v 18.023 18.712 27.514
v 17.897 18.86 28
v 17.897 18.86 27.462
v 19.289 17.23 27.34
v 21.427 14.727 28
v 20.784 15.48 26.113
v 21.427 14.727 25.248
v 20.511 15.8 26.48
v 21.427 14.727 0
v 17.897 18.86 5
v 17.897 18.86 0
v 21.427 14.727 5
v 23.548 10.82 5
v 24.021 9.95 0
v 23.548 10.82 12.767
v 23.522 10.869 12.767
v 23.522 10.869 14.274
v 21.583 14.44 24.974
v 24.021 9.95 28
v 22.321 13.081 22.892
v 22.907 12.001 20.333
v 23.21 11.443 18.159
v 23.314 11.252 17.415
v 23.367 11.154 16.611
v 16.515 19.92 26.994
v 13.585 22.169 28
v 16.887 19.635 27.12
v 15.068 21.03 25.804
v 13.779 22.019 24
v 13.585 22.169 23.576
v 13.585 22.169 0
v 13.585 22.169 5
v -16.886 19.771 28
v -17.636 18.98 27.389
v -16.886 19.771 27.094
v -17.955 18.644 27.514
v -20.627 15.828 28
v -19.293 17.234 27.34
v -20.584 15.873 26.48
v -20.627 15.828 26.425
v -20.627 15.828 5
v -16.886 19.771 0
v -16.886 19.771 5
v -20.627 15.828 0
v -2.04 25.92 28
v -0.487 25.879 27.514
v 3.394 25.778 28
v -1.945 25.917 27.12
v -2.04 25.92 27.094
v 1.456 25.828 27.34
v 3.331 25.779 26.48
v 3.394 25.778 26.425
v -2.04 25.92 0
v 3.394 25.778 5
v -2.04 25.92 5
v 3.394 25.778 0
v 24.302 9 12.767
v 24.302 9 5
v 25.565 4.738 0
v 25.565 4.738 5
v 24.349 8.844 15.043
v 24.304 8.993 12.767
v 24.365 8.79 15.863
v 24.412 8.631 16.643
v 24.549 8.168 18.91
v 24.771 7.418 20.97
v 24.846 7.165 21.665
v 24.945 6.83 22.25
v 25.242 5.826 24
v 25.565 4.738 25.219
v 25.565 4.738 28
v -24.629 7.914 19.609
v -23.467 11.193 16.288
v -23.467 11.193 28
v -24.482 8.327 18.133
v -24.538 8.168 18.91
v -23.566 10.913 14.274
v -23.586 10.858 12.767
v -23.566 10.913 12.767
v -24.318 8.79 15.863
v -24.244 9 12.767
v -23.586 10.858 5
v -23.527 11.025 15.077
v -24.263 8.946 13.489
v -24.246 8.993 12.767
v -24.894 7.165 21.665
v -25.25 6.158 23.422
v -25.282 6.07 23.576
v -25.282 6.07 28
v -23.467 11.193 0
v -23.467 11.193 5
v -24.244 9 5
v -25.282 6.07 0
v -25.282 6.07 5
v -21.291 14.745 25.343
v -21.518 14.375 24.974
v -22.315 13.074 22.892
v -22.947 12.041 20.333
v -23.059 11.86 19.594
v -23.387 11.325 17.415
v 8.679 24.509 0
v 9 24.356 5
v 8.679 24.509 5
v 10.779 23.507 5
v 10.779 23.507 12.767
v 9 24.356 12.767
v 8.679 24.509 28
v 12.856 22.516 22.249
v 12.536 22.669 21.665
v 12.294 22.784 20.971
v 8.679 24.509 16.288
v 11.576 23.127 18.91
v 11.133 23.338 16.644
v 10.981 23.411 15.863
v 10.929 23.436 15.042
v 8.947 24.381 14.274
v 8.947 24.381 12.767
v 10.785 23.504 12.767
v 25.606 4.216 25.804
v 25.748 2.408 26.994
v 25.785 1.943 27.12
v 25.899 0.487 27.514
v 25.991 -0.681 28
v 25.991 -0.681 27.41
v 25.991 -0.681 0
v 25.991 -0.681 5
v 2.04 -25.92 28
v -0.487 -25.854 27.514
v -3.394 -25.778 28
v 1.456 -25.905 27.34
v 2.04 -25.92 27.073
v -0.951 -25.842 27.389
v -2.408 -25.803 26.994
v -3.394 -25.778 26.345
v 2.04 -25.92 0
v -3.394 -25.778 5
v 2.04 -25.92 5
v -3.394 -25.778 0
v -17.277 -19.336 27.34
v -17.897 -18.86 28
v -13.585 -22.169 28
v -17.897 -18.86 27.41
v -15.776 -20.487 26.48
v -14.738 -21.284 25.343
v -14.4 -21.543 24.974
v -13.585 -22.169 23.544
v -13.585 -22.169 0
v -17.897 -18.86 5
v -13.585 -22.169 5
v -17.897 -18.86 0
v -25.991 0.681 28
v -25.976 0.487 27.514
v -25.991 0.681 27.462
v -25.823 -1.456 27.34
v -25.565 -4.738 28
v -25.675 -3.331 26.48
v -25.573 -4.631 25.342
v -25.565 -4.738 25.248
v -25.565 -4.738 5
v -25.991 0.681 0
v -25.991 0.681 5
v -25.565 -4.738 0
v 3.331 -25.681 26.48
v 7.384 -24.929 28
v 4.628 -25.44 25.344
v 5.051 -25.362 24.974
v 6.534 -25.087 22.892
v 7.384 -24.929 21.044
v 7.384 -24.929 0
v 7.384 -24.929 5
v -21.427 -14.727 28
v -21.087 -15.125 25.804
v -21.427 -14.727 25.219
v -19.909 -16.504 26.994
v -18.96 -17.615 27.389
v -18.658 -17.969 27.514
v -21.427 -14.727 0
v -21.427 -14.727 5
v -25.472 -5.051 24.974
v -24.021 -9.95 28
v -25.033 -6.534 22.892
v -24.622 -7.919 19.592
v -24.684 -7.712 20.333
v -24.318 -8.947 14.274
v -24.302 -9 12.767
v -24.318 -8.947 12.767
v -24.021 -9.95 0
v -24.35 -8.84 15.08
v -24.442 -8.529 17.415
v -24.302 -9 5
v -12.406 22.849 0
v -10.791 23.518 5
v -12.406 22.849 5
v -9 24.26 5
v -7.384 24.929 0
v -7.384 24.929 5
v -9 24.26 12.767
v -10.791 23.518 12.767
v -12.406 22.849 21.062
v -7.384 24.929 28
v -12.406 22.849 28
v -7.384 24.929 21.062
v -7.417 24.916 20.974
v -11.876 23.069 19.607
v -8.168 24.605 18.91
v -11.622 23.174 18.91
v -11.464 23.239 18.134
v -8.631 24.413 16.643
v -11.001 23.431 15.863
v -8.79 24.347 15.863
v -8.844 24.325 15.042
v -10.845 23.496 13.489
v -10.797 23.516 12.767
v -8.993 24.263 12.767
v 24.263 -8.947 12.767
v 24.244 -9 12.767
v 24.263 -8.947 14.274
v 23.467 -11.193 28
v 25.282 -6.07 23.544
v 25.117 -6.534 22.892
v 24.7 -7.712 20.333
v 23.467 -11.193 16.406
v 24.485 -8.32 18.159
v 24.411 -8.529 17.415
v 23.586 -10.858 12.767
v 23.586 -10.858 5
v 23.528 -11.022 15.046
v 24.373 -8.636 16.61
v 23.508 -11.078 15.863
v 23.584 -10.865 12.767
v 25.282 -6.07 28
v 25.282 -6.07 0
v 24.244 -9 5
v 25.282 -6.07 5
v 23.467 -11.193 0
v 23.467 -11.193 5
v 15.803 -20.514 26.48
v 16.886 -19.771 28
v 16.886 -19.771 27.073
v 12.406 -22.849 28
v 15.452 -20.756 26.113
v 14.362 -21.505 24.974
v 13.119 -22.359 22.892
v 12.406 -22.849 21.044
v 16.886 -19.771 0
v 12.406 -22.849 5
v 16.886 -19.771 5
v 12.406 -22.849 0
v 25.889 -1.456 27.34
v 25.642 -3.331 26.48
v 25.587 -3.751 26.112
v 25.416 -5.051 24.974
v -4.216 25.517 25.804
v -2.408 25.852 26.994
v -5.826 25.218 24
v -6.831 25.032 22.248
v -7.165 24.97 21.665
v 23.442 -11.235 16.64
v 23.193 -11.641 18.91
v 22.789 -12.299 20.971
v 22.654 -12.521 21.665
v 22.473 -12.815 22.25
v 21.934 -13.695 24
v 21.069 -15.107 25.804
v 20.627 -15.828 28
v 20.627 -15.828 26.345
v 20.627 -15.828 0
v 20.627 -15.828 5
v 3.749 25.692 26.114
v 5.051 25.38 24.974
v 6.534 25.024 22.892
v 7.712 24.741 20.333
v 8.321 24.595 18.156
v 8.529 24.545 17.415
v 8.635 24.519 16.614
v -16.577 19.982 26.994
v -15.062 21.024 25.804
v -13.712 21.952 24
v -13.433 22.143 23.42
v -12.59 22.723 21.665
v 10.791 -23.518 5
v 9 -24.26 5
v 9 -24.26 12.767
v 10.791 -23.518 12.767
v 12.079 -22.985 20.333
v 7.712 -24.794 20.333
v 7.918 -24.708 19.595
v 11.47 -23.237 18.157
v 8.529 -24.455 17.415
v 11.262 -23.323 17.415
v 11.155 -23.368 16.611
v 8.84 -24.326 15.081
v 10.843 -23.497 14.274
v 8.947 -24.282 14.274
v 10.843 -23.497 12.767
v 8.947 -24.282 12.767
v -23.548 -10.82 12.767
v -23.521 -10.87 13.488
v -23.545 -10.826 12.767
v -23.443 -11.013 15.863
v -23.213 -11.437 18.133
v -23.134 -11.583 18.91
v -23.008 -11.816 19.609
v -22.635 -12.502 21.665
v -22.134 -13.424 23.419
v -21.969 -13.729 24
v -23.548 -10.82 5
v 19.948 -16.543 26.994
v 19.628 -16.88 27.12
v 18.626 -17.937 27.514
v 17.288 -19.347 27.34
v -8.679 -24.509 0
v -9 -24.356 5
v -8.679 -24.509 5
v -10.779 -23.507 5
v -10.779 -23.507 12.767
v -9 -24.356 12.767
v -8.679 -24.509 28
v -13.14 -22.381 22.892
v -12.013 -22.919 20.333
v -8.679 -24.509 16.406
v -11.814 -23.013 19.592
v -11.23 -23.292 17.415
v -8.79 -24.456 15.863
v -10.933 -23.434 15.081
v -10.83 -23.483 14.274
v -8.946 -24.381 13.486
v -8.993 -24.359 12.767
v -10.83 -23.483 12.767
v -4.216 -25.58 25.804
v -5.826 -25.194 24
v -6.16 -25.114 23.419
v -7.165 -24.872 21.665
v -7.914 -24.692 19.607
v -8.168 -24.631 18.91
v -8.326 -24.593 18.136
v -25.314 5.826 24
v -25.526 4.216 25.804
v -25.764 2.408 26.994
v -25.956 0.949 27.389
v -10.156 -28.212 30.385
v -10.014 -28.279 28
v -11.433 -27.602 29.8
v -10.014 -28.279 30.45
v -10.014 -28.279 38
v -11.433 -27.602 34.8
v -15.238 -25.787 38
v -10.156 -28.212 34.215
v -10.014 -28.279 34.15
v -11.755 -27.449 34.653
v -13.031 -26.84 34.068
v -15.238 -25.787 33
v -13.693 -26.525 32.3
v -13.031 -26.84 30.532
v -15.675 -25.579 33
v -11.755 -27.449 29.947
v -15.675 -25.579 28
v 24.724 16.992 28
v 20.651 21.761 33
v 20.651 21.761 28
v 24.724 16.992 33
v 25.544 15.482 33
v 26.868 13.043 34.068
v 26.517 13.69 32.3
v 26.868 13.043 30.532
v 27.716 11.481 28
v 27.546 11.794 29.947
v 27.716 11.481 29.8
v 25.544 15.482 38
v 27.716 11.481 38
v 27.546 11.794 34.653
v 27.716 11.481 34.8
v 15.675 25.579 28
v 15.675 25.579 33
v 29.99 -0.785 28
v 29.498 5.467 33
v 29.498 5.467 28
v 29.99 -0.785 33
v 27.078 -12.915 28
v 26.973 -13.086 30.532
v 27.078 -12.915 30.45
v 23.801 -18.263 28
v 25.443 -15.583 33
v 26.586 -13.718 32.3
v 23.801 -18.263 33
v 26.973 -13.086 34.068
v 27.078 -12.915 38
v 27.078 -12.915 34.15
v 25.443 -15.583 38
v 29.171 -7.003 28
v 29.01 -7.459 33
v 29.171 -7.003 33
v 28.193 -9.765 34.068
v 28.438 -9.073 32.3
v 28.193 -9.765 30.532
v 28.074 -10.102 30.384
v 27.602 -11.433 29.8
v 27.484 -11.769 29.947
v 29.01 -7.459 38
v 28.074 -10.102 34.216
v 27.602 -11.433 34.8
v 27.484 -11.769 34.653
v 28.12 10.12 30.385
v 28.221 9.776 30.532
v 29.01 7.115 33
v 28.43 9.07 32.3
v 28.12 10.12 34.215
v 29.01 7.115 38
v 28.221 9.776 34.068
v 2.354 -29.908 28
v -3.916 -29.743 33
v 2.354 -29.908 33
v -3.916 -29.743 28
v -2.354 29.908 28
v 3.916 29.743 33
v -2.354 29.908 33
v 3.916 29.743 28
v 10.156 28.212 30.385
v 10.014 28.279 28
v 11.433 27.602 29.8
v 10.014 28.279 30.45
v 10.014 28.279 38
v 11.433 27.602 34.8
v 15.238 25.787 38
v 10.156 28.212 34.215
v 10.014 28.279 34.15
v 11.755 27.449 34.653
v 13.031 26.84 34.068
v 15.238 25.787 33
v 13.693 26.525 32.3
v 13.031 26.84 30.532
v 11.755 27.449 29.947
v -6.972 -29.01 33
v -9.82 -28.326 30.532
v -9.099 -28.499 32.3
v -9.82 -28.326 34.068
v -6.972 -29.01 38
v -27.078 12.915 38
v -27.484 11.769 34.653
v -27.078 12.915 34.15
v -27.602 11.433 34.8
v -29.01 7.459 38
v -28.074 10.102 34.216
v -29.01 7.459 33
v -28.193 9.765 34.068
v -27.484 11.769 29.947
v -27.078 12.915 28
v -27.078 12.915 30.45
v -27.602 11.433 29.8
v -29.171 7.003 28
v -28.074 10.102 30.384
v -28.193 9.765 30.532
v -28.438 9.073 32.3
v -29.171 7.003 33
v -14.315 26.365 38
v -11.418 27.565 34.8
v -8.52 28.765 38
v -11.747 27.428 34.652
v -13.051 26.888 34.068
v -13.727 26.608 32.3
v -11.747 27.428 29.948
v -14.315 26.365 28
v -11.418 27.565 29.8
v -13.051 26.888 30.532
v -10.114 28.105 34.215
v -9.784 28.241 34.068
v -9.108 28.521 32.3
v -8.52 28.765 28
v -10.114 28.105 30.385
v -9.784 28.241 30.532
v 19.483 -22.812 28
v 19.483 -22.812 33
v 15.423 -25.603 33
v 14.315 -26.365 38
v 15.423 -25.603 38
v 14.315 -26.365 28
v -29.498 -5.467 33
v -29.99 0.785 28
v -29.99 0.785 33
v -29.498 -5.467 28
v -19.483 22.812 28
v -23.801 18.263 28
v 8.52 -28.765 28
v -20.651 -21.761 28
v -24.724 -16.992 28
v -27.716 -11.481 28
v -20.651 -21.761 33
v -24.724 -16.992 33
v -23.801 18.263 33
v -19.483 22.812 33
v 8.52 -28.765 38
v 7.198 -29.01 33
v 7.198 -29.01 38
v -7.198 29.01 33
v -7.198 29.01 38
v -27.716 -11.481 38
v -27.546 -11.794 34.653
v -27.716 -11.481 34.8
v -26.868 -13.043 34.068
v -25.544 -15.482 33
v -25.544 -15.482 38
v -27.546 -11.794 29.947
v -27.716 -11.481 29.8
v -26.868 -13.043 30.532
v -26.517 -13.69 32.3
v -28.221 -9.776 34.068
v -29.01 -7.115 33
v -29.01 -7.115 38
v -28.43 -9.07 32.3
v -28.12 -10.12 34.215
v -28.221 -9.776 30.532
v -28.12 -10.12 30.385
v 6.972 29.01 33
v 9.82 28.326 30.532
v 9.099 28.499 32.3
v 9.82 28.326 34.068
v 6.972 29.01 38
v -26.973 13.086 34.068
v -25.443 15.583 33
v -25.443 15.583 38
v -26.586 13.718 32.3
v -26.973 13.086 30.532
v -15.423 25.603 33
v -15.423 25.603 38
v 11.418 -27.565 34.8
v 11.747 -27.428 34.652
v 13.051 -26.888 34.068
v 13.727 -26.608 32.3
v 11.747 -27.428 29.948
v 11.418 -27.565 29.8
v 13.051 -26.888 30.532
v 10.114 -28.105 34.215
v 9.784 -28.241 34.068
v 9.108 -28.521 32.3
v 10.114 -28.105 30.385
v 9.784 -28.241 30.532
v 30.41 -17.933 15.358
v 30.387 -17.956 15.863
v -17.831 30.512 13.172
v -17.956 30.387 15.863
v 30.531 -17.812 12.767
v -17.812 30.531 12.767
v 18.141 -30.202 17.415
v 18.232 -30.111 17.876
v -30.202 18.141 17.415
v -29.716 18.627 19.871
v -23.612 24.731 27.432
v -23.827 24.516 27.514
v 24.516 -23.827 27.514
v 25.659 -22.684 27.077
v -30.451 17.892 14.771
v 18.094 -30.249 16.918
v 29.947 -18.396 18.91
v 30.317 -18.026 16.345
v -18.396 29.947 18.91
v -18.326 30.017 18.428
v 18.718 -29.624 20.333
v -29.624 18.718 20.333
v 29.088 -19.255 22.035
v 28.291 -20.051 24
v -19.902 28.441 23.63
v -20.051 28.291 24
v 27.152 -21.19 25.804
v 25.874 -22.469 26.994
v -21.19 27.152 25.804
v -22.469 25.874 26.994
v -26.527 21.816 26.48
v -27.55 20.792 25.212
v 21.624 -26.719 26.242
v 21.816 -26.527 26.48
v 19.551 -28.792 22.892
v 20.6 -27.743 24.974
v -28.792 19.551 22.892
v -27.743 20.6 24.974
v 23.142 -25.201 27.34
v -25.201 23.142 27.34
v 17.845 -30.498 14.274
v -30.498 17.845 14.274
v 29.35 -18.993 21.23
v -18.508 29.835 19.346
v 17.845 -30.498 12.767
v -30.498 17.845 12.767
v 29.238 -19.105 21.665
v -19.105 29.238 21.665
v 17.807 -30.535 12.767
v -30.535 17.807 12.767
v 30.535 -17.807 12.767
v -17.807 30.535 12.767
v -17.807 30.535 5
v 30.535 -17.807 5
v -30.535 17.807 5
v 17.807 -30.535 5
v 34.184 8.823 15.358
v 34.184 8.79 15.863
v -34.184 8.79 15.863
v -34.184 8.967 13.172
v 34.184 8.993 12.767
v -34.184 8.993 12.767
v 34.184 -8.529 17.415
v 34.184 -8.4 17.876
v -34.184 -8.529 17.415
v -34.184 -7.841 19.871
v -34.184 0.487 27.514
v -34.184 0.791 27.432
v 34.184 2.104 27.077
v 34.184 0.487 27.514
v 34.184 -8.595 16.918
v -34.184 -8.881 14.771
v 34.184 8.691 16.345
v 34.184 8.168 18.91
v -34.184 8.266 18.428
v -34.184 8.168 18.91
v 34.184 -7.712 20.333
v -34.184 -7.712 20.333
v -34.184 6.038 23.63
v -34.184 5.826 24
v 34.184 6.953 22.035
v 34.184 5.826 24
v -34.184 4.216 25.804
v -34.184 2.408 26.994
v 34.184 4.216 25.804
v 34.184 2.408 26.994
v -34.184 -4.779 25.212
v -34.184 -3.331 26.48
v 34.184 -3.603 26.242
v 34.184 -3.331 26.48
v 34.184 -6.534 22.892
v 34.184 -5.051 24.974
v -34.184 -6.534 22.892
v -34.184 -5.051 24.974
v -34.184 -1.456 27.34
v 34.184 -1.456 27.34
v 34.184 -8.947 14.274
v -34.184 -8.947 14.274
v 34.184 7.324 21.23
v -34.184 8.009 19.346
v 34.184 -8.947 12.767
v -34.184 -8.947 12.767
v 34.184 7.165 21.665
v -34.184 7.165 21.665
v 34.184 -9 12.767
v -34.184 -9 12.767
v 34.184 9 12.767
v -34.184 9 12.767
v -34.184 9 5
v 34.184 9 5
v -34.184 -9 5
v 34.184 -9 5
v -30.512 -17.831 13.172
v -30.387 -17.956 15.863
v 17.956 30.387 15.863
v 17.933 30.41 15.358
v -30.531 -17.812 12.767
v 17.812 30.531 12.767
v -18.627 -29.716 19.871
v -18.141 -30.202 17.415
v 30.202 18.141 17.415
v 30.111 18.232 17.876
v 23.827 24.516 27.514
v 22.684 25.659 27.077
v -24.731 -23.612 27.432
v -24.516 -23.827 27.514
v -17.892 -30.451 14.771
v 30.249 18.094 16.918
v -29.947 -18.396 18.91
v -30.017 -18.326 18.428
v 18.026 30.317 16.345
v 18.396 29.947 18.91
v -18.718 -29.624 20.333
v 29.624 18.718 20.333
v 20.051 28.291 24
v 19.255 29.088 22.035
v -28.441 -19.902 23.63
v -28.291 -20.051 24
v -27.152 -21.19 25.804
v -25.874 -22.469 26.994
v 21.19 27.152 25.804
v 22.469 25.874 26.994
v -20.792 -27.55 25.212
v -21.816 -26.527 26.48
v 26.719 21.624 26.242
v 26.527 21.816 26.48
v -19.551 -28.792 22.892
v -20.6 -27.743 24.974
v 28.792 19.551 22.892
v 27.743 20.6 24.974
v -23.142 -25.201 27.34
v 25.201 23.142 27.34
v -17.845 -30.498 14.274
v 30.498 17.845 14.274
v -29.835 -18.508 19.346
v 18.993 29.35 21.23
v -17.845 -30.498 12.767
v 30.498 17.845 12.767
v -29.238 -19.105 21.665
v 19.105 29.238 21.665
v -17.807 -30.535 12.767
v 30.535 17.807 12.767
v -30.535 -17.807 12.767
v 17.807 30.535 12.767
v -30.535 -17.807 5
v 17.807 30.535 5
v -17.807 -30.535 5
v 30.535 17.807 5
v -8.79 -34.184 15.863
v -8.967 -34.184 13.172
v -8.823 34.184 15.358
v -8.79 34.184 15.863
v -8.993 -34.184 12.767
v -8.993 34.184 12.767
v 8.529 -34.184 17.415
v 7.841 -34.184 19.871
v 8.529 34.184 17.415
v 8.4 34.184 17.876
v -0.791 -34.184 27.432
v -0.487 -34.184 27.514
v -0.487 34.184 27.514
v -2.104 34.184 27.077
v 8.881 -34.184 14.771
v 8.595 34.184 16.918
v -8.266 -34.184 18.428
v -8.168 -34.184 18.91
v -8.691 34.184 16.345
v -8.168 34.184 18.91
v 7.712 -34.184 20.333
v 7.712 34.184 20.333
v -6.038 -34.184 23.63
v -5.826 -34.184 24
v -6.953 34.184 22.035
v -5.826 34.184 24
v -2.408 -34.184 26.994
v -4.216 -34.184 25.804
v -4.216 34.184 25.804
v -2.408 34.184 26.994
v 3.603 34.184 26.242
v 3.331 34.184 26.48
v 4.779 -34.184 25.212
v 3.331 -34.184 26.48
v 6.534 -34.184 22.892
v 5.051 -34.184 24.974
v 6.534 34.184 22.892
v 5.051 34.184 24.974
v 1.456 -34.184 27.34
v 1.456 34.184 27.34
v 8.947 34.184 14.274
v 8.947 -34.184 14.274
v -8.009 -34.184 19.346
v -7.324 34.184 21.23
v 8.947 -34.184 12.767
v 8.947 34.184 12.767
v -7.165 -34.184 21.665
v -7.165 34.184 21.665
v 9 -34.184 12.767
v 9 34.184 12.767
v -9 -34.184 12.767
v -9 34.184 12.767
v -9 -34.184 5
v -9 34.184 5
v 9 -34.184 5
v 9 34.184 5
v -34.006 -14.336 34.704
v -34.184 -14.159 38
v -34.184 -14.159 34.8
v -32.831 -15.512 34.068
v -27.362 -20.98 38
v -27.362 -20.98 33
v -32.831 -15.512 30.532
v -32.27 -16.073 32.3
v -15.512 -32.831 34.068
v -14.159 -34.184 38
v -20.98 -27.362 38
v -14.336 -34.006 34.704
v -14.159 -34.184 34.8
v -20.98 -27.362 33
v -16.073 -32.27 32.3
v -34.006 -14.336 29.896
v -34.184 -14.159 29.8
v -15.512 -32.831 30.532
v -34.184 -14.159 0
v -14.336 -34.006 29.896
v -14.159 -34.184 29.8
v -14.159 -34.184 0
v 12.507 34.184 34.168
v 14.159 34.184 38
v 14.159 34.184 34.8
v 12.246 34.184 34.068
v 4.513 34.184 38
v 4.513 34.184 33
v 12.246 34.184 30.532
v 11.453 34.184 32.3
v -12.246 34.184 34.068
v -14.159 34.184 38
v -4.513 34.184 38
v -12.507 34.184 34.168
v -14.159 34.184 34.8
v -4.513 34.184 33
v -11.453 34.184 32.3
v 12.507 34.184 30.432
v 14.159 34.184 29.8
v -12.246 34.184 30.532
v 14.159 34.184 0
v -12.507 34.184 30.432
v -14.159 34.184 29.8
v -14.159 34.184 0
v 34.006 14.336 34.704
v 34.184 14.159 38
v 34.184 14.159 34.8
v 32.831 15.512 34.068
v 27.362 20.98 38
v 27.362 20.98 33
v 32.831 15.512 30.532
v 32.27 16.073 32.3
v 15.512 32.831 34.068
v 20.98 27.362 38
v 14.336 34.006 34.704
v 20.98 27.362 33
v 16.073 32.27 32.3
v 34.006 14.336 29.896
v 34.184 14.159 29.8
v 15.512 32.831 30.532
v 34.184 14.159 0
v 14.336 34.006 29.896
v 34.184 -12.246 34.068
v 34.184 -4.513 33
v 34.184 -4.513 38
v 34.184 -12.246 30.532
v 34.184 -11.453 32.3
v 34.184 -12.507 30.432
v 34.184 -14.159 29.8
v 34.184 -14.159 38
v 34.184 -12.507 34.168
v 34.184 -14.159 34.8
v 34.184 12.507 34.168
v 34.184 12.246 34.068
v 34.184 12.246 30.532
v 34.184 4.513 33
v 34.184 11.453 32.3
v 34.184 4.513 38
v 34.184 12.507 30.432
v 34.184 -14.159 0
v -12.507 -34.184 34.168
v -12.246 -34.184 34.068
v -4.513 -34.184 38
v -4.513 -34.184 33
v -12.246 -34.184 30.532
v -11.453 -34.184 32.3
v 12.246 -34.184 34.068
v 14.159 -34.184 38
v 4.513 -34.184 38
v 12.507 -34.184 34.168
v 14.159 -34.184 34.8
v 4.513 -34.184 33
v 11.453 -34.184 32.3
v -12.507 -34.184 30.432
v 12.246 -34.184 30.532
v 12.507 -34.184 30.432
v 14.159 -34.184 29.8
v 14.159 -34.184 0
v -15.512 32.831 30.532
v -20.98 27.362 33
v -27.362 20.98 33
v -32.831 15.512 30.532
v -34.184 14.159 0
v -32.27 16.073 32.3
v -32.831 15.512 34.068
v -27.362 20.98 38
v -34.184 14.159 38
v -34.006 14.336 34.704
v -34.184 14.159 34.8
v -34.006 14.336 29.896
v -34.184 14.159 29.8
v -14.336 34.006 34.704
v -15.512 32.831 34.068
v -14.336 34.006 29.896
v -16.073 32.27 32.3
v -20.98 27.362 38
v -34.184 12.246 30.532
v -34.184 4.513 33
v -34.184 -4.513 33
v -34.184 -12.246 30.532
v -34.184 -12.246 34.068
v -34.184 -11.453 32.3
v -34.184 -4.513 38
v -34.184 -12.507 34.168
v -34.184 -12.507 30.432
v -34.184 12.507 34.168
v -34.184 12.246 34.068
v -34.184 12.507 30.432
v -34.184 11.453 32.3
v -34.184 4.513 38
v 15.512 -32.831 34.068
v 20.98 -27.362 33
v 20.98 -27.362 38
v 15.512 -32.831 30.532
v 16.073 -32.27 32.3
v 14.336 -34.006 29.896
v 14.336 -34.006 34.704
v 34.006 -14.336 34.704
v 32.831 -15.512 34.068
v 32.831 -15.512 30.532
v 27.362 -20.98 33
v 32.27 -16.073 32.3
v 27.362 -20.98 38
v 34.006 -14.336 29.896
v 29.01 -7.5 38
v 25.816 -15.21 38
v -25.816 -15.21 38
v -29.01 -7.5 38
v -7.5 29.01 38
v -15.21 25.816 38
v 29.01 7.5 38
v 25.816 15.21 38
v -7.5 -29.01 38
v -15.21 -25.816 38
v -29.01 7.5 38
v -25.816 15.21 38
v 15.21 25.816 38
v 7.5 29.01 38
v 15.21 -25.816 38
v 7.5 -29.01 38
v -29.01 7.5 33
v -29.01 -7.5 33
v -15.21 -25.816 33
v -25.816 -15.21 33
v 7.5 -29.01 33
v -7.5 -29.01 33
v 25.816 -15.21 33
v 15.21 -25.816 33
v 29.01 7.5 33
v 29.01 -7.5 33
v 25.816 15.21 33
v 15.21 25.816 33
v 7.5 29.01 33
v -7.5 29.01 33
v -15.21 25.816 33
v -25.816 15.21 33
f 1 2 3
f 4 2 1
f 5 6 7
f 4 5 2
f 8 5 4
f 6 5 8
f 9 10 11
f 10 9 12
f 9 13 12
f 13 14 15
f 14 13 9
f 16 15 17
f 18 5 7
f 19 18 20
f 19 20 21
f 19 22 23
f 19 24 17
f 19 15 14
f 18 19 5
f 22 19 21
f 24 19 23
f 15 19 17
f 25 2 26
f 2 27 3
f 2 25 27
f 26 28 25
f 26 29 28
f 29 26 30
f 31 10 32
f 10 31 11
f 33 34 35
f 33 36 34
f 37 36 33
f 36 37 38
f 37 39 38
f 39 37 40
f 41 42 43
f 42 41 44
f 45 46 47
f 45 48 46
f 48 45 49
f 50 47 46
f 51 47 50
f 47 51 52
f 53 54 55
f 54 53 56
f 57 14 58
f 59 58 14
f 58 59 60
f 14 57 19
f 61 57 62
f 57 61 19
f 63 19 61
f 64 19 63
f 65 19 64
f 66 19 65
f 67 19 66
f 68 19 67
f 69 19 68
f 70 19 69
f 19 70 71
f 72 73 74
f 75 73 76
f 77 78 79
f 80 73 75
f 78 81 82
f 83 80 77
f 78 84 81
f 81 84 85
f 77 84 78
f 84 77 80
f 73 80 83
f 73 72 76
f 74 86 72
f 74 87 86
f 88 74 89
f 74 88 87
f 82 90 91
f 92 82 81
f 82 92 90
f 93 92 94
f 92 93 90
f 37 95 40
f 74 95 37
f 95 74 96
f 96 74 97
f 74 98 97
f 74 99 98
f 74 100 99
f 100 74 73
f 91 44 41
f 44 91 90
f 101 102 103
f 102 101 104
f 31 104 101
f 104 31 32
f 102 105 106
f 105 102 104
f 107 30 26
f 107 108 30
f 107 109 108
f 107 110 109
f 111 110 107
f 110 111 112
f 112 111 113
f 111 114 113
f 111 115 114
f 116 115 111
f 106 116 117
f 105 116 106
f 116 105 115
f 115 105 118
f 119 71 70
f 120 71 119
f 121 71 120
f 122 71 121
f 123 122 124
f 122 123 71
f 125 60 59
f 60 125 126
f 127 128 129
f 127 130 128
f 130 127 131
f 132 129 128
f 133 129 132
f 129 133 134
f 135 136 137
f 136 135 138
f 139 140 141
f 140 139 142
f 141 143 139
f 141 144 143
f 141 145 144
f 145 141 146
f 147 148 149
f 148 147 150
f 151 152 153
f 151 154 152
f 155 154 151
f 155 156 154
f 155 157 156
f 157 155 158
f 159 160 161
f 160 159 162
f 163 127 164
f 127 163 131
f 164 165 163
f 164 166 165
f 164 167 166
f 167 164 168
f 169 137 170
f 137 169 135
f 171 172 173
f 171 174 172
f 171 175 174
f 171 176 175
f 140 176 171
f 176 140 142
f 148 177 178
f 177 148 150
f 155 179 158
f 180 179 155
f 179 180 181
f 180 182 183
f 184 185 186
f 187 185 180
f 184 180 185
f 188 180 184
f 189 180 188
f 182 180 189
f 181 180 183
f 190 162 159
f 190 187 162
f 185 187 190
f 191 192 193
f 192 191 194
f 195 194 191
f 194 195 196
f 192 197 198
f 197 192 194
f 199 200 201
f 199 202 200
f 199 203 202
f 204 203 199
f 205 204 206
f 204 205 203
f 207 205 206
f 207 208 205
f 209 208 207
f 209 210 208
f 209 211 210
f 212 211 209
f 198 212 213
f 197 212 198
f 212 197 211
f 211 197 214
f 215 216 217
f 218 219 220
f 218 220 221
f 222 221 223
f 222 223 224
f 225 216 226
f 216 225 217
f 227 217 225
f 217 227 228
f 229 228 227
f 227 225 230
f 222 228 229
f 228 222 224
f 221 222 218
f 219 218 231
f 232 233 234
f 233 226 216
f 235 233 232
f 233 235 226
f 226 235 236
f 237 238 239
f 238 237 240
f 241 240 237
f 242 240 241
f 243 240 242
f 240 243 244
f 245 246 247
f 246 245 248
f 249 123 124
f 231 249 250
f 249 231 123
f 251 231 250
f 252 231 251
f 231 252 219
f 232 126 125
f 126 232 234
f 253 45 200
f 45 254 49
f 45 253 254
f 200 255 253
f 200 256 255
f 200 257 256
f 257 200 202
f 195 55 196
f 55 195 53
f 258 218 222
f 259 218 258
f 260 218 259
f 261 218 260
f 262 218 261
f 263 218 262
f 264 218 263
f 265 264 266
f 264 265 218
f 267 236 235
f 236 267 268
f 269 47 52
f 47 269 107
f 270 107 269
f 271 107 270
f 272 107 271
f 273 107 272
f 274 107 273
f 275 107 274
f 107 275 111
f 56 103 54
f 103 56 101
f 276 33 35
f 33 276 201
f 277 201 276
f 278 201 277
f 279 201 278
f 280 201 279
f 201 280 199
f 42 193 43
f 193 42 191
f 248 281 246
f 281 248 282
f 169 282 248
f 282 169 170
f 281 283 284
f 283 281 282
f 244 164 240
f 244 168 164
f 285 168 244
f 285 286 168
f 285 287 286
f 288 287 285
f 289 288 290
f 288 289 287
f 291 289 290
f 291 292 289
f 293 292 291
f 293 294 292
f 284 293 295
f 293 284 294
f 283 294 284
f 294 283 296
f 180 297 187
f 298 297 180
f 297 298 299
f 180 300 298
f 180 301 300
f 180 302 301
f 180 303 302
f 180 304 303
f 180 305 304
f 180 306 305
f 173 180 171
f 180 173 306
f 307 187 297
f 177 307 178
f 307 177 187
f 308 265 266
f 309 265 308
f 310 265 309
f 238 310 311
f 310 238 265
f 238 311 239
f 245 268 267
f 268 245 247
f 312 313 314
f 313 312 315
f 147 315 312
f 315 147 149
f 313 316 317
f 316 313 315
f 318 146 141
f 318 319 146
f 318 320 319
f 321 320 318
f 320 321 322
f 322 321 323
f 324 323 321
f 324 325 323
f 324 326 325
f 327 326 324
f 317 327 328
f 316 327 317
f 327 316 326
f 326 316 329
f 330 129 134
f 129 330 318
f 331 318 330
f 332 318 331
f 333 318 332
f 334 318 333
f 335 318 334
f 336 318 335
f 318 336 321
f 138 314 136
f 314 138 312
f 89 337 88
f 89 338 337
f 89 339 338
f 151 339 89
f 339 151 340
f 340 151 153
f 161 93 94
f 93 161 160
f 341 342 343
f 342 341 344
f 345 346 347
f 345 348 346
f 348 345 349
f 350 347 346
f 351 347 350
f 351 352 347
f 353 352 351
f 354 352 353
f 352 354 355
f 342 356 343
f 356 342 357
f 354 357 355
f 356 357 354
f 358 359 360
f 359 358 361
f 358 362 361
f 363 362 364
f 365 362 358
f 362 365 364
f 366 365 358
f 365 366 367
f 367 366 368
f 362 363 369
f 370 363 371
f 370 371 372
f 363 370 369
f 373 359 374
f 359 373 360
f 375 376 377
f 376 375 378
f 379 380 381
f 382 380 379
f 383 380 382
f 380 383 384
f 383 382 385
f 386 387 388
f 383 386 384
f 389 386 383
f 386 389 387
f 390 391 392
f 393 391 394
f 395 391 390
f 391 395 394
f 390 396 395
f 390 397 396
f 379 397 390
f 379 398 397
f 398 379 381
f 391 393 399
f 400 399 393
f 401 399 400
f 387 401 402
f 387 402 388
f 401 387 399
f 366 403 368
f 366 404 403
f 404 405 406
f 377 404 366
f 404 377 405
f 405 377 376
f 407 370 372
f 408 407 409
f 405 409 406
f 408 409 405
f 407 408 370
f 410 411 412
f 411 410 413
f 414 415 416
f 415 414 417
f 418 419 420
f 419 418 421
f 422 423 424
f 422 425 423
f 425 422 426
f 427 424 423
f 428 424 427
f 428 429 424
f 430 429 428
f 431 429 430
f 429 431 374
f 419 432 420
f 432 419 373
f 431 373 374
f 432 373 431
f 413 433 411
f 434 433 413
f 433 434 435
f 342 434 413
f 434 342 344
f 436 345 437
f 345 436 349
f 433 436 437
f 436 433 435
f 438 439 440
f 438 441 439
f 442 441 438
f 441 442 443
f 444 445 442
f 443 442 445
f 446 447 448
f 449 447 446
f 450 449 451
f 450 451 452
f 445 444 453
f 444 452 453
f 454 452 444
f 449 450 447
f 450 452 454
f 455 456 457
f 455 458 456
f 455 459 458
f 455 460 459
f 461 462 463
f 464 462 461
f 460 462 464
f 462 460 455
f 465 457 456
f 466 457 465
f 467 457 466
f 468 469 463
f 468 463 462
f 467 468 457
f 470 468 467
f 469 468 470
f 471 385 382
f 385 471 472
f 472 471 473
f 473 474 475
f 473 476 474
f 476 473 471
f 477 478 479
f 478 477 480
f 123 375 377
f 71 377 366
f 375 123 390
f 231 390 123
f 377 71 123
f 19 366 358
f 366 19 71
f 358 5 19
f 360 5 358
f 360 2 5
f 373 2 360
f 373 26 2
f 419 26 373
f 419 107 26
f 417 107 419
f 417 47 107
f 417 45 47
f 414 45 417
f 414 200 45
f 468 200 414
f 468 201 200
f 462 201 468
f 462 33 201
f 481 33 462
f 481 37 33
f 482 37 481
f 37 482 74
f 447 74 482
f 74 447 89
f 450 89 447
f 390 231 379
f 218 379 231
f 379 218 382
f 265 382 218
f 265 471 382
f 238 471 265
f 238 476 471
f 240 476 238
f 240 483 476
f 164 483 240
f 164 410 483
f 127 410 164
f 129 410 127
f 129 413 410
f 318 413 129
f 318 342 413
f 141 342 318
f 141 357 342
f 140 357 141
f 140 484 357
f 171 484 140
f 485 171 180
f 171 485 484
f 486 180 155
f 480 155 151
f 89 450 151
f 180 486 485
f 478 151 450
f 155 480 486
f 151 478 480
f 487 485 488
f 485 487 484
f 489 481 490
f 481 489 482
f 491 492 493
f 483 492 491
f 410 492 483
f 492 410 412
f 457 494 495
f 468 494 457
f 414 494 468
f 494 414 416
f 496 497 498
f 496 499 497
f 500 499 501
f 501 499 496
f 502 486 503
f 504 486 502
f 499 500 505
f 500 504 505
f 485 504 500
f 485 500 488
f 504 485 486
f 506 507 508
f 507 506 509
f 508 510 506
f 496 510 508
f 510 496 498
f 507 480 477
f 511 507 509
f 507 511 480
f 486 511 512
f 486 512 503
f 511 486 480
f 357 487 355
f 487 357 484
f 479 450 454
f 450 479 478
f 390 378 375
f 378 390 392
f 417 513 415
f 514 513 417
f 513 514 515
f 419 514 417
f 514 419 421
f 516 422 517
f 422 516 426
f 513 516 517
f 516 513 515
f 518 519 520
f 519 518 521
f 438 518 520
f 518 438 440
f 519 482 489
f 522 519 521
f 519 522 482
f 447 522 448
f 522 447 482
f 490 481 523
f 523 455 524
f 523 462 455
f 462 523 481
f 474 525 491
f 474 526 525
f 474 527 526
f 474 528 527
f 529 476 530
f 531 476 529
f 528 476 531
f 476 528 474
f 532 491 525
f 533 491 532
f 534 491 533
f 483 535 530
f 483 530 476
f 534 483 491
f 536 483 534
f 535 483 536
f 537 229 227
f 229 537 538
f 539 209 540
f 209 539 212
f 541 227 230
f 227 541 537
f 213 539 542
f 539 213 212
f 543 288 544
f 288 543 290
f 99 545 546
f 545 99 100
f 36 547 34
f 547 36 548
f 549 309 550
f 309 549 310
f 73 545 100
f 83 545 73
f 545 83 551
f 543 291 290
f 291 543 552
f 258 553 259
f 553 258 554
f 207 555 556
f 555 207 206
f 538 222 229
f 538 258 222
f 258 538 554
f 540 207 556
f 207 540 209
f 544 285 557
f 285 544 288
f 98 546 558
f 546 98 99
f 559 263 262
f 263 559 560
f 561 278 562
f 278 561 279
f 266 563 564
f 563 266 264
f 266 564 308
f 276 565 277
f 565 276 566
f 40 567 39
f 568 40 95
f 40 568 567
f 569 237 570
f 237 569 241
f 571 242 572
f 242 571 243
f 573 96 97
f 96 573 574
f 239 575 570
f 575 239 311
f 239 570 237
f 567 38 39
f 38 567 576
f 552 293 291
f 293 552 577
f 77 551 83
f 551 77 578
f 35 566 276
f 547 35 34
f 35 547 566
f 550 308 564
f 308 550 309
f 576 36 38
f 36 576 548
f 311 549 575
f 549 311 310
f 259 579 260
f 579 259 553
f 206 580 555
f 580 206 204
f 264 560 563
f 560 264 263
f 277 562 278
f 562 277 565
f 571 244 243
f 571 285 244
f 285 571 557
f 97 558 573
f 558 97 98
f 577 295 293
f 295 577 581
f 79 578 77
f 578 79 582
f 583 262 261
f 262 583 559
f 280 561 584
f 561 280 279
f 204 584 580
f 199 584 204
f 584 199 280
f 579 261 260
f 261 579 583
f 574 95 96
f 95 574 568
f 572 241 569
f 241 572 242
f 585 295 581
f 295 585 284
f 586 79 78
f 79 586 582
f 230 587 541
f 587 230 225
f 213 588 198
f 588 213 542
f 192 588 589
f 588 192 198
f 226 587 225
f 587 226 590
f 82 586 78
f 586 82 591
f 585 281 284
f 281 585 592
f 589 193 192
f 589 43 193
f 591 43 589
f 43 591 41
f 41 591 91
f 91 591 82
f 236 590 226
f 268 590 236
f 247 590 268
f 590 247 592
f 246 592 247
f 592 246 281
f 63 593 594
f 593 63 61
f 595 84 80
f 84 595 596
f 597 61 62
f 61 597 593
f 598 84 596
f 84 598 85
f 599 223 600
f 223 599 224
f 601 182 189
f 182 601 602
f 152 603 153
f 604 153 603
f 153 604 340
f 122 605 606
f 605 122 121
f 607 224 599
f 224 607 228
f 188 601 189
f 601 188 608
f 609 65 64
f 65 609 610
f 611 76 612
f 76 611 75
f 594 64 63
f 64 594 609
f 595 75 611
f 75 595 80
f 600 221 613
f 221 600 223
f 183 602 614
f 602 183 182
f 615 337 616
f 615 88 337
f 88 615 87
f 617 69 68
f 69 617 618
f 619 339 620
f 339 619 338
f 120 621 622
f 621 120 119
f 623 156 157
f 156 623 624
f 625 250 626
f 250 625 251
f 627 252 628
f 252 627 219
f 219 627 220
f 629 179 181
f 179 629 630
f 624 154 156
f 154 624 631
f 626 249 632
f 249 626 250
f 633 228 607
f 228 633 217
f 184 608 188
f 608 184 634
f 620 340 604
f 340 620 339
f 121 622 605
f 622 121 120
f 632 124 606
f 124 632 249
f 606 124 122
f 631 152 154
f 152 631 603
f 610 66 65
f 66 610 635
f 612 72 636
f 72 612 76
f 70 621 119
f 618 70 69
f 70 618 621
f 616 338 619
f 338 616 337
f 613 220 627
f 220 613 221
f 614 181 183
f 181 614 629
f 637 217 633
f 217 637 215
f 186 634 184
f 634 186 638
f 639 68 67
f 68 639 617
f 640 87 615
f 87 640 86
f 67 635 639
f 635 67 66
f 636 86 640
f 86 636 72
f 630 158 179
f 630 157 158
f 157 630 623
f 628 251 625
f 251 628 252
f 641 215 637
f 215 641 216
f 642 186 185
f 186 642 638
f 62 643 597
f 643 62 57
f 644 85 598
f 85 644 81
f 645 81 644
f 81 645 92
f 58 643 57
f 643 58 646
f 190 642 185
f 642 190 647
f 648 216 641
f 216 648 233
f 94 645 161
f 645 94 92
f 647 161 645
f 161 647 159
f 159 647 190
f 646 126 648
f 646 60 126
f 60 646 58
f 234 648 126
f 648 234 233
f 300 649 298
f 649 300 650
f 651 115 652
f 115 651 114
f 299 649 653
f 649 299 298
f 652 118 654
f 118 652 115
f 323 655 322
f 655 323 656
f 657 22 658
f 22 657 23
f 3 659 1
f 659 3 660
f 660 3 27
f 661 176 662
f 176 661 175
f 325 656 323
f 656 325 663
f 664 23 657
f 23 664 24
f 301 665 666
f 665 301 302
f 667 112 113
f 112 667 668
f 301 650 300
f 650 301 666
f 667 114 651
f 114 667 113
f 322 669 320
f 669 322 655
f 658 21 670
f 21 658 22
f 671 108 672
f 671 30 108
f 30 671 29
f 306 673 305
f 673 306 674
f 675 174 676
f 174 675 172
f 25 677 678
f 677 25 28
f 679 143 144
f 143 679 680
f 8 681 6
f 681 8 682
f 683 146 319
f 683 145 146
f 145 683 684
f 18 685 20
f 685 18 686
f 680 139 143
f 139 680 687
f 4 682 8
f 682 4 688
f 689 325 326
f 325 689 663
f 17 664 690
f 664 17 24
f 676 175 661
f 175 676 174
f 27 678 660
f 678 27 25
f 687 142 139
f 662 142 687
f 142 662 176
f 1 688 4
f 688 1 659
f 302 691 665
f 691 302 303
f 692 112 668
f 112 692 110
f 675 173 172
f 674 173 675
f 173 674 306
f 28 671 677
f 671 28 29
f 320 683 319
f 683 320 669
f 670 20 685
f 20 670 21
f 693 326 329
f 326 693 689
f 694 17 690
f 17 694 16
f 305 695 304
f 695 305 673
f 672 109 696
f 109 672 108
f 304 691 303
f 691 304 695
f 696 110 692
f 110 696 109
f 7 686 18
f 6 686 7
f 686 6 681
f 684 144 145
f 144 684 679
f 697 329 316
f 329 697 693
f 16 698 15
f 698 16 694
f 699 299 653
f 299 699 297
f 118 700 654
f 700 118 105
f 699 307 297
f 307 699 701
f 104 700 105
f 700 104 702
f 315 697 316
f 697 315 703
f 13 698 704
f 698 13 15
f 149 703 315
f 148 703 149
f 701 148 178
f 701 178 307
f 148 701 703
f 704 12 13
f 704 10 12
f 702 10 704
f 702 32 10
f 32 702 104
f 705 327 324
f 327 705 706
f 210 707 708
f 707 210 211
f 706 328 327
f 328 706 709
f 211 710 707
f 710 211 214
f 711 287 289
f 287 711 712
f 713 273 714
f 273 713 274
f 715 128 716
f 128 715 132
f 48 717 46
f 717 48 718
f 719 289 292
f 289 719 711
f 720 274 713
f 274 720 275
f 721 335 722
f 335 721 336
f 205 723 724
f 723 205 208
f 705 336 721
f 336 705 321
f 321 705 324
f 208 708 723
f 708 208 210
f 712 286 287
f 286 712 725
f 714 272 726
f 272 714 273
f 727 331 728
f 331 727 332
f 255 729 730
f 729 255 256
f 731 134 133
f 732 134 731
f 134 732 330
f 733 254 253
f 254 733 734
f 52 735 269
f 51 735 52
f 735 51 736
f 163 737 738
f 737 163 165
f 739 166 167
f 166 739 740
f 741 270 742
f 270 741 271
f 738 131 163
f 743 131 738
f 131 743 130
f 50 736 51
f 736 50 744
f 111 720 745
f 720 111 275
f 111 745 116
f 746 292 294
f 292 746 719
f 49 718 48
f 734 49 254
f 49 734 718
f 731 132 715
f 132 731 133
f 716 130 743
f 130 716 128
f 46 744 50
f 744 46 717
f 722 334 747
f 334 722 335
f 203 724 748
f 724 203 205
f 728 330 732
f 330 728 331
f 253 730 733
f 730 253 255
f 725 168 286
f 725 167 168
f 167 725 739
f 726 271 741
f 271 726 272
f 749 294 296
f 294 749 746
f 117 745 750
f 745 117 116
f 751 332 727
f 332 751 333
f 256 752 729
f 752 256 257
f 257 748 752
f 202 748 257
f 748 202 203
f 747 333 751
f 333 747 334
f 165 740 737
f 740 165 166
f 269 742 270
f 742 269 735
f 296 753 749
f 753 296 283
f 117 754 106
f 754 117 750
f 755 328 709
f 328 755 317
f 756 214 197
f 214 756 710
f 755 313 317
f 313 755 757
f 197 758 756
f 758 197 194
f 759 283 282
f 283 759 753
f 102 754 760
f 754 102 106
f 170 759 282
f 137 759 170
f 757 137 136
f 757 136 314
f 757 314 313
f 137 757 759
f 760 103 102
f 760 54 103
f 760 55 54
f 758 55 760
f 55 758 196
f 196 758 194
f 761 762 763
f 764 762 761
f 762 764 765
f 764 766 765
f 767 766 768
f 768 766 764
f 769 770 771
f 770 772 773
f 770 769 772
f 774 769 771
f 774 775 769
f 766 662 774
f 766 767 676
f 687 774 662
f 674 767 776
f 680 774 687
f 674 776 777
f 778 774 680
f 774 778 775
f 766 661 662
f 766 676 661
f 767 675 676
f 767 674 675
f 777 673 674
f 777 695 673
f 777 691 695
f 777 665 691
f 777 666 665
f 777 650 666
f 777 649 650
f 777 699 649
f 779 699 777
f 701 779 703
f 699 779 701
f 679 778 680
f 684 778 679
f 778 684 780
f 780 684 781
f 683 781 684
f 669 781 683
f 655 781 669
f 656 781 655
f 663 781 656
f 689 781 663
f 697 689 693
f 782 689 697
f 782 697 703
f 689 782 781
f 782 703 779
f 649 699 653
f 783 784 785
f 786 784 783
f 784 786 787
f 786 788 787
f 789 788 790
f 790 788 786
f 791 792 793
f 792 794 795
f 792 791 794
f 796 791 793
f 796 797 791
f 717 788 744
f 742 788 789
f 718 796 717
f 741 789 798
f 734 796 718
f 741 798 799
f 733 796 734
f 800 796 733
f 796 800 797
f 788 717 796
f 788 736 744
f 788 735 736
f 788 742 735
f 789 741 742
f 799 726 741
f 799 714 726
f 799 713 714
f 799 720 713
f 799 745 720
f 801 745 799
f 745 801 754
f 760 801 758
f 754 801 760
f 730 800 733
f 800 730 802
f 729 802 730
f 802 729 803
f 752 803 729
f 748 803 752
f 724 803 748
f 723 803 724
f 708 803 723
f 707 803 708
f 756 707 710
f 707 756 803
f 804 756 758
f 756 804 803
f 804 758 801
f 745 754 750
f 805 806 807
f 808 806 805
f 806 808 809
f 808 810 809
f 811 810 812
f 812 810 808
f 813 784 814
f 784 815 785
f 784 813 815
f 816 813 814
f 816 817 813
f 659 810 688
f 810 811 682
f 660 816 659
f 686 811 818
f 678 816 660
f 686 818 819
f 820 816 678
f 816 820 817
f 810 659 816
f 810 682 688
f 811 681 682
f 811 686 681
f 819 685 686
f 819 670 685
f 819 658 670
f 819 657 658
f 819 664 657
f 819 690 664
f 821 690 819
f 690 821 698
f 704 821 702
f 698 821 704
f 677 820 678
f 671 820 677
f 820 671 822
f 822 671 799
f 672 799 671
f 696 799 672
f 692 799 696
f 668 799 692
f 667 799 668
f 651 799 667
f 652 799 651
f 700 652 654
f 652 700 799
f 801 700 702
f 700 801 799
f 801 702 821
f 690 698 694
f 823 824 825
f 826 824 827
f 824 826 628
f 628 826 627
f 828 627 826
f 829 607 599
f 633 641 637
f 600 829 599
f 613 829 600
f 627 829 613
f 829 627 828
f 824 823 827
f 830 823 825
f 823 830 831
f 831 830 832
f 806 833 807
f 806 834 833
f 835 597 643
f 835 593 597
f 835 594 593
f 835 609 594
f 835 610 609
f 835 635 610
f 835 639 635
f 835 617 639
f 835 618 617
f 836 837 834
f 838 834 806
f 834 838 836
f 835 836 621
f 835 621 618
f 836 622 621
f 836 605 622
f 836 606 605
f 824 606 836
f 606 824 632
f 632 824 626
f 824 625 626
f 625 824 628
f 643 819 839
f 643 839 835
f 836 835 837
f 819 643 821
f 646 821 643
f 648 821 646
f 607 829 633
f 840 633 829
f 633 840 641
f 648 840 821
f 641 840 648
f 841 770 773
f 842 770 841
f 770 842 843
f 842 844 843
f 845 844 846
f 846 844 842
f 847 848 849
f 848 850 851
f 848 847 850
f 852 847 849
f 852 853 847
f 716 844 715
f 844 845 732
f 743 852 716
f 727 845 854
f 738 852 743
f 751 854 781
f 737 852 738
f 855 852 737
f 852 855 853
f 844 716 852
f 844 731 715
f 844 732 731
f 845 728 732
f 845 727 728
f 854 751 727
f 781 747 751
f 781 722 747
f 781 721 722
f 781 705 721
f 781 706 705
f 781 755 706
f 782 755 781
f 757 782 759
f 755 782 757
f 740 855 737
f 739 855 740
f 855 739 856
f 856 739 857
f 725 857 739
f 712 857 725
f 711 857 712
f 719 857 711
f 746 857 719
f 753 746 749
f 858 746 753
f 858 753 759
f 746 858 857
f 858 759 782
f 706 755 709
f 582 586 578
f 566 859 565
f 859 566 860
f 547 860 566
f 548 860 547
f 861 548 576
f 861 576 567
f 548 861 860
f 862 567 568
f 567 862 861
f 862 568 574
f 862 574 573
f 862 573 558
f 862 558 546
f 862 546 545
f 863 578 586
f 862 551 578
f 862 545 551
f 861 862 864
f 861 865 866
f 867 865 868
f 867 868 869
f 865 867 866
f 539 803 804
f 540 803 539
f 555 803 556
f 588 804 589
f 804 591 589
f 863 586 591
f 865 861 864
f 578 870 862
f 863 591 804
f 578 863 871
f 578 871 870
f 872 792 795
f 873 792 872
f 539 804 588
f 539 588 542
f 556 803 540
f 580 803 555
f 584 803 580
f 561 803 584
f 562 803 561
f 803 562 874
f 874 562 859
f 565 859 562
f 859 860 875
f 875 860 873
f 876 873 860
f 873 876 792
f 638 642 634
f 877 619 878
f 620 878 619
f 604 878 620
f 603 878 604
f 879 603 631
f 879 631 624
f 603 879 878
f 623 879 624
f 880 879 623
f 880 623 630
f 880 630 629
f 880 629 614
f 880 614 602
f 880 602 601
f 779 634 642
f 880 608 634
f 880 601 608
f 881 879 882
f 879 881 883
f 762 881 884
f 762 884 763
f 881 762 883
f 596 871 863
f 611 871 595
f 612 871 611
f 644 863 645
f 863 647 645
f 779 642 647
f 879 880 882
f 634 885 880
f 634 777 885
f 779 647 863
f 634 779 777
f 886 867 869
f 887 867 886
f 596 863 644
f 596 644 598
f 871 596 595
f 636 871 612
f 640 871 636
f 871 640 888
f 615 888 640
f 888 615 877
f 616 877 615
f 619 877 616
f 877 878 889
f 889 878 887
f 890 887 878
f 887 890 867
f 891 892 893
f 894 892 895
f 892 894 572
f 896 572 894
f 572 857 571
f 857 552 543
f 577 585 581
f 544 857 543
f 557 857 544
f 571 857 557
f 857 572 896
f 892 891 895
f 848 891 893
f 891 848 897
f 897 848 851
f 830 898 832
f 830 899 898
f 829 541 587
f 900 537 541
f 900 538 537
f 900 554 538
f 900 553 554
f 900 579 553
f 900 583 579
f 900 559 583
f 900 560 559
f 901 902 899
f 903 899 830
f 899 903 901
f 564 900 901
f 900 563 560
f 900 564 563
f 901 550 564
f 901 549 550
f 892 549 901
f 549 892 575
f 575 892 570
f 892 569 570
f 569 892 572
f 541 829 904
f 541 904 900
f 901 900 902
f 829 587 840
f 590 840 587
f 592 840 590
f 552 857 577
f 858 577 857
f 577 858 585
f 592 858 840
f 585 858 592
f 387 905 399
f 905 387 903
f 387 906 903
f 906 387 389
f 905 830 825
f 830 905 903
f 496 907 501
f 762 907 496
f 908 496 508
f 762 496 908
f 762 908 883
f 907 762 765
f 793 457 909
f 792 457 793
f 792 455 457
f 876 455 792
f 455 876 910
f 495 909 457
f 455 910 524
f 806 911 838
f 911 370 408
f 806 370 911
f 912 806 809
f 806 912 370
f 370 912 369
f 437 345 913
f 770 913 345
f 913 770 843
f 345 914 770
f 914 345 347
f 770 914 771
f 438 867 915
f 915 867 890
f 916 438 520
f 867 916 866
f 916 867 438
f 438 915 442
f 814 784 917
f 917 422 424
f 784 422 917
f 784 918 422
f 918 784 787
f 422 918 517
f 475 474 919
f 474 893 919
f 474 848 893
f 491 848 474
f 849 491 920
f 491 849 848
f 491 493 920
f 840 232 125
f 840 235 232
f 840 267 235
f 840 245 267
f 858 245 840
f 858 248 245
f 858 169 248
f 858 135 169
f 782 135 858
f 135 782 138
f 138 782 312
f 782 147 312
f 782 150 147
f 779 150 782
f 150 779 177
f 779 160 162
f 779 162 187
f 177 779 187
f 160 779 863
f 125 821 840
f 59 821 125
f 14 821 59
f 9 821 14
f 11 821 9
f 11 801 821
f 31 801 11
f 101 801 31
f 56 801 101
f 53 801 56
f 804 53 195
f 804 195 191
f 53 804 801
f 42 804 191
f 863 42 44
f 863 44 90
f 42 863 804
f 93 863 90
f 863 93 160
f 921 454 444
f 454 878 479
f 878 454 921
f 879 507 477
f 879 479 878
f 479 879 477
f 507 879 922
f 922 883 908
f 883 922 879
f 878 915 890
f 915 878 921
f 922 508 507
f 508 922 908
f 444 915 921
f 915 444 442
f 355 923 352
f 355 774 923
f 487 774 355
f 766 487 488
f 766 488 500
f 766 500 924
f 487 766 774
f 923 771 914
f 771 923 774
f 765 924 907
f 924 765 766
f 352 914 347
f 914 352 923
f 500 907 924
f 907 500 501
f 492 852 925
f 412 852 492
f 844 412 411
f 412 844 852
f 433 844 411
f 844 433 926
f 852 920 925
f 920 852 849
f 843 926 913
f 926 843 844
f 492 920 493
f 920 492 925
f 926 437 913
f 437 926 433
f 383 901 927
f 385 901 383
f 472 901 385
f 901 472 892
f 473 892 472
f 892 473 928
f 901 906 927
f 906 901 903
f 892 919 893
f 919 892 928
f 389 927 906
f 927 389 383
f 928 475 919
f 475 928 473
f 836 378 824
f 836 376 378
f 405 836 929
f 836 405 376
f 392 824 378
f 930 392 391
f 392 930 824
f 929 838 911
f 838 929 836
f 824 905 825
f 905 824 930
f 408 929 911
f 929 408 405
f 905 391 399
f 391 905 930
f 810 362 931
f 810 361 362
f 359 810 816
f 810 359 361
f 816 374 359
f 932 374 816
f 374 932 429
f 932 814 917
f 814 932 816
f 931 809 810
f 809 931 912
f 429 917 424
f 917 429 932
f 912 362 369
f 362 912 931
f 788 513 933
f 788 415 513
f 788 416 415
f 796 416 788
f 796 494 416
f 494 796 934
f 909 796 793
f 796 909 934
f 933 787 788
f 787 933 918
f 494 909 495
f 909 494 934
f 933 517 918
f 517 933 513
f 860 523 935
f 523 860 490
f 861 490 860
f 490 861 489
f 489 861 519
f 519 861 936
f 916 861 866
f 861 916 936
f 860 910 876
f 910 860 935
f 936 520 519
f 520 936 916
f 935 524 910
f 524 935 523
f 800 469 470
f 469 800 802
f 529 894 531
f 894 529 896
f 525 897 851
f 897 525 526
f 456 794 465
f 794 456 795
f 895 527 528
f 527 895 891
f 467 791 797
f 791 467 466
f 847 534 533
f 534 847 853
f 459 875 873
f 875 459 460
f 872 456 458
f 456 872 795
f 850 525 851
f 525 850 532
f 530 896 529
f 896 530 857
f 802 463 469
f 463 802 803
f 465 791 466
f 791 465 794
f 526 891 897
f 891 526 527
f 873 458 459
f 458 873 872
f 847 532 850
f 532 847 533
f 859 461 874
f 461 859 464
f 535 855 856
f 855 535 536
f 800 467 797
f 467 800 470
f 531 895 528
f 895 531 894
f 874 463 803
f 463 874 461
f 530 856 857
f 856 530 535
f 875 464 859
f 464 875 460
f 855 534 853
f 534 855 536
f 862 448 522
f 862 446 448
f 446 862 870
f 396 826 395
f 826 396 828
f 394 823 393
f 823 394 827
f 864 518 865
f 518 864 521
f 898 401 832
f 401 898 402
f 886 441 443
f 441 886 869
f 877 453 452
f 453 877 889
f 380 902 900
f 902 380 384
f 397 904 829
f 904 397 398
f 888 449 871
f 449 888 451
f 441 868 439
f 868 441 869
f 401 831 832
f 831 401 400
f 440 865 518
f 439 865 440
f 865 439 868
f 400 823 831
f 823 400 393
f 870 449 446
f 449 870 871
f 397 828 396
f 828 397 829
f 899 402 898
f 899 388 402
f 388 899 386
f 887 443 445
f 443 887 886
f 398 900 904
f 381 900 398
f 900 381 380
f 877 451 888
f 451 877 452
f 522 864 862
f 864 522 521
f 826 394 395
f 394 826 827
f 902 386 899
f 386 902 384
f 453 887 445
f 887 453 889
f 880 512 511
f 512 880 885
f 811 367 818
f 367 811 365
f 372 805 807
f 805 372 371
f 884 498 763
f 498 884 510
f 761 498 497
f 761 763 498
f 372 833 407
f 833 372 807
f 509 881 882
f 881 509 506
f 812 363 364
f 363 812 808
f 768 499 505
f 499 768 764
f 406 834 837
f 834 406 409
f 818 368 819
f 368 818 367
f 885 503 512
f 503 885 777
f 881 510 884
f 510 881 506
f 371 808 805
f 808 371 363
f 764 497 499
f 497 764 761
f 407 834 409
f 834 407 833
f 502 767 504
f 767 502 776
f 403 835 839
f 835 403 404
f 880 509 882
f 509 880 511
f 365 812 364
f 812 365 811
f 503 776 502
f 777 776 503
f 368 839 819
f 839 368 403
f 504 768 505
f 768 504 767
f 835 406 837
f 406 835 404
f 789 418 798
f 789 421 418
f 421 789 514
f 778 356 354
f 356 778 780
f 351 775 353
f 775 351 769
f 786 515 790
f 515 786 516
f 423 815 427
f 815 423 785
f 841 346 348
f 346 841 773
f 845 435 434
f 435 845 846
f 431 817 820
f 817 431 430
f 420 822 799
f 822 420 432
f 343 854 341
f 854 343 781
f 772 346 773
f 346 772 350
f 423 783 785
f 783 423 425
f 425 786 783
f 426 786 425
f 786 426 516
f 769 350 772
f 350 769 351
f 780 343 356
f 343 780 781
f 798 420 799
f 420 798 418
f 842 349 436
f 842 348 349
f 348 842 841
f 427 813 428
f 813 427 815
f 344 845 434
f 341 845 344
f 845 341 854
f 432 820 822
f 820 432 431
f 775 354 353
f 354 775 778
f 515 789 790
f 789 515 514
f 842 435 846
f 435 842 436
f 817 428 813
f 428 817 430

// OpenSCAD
// [FL_INDEX: keywords="openscad, 3d_parametric, Variable_Width_for_Yet_Another_Printable_Spool, csg_solid" | COT="Parametric OpenSCAD design from 3DCodeverse"]
// Title: Variable Width for Yet Another Printable Spool

// is the width of the spool hub
reelWidth = 38; // [35:100]

module core() {

	innerCylWidth = max(10, (reelWidth/4));

	//echo(innerCylWidth);
	union() {
		// x was 60
		translate([0,0,-0.05])cylinder(reelWidth+0.1,26,26);
	    // translate z was 60
		translate([0,0,min(reelWidth,reelWidth-(innerCylWidth+0))])
			cylinder(innerCylWidth+.05,30,30);
	}
}

module arch() {
     //   reelWidth was 25
	translate([0,0,reelWidth/3])union() {
		difference() {
			// z scale was 3.3
			scale([1,1,reelWidth/23])
				rotate([90,0,22.5])
					translate([0,0,-50])
						cylinder(100,9,9);
			translate([-50,-50,-50])
				cube([100,100,50]);
		}
		// cube z was 21
	    // translate z was -20
		rotate([0,0,22.5]) 
			translate([-9,-50,-((reelWidth/3)-5)])
				cube([18,100,(reelWidth/3.0)-4.9]);
	}
}
module eTrangle(height,length) {
	rotate([0,0,-30])
	difference() {
		cube([length,length,height]);
		translate([0,0,-0.5])rotate([0,0,60])cube([length*1.2,length*1.2,height+1]);
		translate([length,0,-0.5])rotate([0,0,30])cube([length*1.2,length*1.2,height+1]);
	}
}
module reel() {
	difference() {
		cylinder(reelWidth,37,37,$fn=8);
		core();
		arch();
		rotate([0,0,45]) arch();
		rotate([0,0,90]) arch();
		rotate([0,0,135]) arch();
	}
}
module drumCentre() {
	filamentHoleRotation =  reelWidth < 60 ? 22.5 : 0;
	difference() {
		
		rotate([0,0,22.5])reel();

		for (i=[0:7]) {
			//rotate([0,0,i*45])translate([-42,0,-0.1])eTrangle(5.2,15);
			// translate z was 71
			rotate([0,0,i*45])translate([-42,0,reelWidth-5])eTrangle(5.1,15);
		}
		// filament holes
		for (i=[0:3]) {
             // translate y was 65
			rotate([90,0,(i*45)+filamentHoleRotation]) translate([0,reelWidth*.85,-50]) 
				cylinder(100,2.5,2.5);
		}

	}
}
module arm() {
	translate([34.25,-7.5,0]) difference() {
		union() {
			translate([0,0,0])cube([65,15,5]);
			translate([7.45,7.5,0])rotate([0,0,180])eTrangle(5,14.5);
		}
		translate([5,-0.1,-0.1])cube([45,5.1,5.2]);
		translate([5,10.1,-0.1])cube([45,5.1,5.2]);
		translate([62.5,4,-0.1])rotate([0,0,210])eTrangle(5.2,10);
		translate([62.5,11,-0.1])rotate([0,0,150])eTrangle(5.2,10);
	}
}
module loadArm() {
	import_stl("spool2arm.stl",convexity=10);
}
module edge(withHoles) {
	union() {
		difference() {
			cylinder(5,99.6,99.6,$fn=60);
			translate([0,0,-0.1])cylinder(5.2,84.6,84.6,$fn=60);
			translate([-105,-102.45,-0.1])cube([210,110,10]);
			rotate([0,0,45])translate([-105,-7.55,-0.1])cube([210,110,10]);
			if (withHoles) {
				translate([90.5,18,-0.1]) cylinder(5.2,2.5,2.5);
				translate([87.5,30,-0.1]) cylinder(5.2,2.5,2.5);
				translate([82.5,42,-0.1]) cylinder(5.2,2.5,2.5);
				translate([76,52,-0.1]) cylinder(5.2,2.5,2.5);
			}
		}
		rotate([0,0,45])translate([86.85,-3.6,0])rotate([0,0,-30]) eTrangle(5,9.8);
		translate([96.65,3.6,0])rotate([0,0,150]) eTrangle(5,9.8);
	}
}
module spool() {
	translate([5,0,0])import_stl("spool2core.stl",convexity=10);
	for (i=[0:7]) {
		rotate([0,0,i*45])loadArm();
		rotate([0,0,i*45])translate([0,0,71])loadArm();
		rotate([0,0,i*45])edge((i%2)==0);
		rotate([0,0,i*45])translate([0,0,71])edge((i%2)==1);
	}
}
module explodedSpool() {
	translate([5,0,0])import_stl("spool2core.stl",convexity=10);
	for (i=[0:7]) {
		rotate([0,0,i*45])translate([10,0,0]) loadArm();
		rotate([0,0,i*45])translate([10,0,71])loadArm();
		rotate([0,0,i*45])translate([20,10,0]) edge((i%2)==0);
		rotate([0,0,i*45])translate([20,10,71])edge((i%2)==1);
	}
}

//%color([0.5,0.5,0.5,0.1]) translate([-50,-50,-1.01]) cube([100,100,1]);
module arms(allSix) {
	translate([-75,-6,0]) arm();
	translate([-57,6,0]) arm();
	translate([-57,-18,0]) arm();
	translate([-75,18,0]) arm();
	if (allSix)  {
		translate([-75,-30,0]) arm();
		translate([-57,30,0]) arm();
	}
}
module edges() {
	translate([2,-10,0])rotate([0,0,67.5])translate([-85,-33.5,0]) edge(true);
	translate([2,10,0])rotate([0,0,67.5])translate([-85,-33.5,0]) edge(false);
	translate([2,30,0])rotate([0,0,67.5])translate([-85,-33.5,0]) edge(true);
	translate([2,-30,0])rotate([0,0,67.5])translate([-85,-33.5,0]) edge(false);
}

//arms(false);
//edges();
//translate([0,-200,0])arms(true);
//translate([125,-200,0])arm();
//translate([250,-200,0])edges();
//translate([250,0,0])spool();
//explodedSpool();
//translate([125,-200,0])translate([5,0,0])import_stl("spool2core.stl",convexity=10);
drumCentre();
